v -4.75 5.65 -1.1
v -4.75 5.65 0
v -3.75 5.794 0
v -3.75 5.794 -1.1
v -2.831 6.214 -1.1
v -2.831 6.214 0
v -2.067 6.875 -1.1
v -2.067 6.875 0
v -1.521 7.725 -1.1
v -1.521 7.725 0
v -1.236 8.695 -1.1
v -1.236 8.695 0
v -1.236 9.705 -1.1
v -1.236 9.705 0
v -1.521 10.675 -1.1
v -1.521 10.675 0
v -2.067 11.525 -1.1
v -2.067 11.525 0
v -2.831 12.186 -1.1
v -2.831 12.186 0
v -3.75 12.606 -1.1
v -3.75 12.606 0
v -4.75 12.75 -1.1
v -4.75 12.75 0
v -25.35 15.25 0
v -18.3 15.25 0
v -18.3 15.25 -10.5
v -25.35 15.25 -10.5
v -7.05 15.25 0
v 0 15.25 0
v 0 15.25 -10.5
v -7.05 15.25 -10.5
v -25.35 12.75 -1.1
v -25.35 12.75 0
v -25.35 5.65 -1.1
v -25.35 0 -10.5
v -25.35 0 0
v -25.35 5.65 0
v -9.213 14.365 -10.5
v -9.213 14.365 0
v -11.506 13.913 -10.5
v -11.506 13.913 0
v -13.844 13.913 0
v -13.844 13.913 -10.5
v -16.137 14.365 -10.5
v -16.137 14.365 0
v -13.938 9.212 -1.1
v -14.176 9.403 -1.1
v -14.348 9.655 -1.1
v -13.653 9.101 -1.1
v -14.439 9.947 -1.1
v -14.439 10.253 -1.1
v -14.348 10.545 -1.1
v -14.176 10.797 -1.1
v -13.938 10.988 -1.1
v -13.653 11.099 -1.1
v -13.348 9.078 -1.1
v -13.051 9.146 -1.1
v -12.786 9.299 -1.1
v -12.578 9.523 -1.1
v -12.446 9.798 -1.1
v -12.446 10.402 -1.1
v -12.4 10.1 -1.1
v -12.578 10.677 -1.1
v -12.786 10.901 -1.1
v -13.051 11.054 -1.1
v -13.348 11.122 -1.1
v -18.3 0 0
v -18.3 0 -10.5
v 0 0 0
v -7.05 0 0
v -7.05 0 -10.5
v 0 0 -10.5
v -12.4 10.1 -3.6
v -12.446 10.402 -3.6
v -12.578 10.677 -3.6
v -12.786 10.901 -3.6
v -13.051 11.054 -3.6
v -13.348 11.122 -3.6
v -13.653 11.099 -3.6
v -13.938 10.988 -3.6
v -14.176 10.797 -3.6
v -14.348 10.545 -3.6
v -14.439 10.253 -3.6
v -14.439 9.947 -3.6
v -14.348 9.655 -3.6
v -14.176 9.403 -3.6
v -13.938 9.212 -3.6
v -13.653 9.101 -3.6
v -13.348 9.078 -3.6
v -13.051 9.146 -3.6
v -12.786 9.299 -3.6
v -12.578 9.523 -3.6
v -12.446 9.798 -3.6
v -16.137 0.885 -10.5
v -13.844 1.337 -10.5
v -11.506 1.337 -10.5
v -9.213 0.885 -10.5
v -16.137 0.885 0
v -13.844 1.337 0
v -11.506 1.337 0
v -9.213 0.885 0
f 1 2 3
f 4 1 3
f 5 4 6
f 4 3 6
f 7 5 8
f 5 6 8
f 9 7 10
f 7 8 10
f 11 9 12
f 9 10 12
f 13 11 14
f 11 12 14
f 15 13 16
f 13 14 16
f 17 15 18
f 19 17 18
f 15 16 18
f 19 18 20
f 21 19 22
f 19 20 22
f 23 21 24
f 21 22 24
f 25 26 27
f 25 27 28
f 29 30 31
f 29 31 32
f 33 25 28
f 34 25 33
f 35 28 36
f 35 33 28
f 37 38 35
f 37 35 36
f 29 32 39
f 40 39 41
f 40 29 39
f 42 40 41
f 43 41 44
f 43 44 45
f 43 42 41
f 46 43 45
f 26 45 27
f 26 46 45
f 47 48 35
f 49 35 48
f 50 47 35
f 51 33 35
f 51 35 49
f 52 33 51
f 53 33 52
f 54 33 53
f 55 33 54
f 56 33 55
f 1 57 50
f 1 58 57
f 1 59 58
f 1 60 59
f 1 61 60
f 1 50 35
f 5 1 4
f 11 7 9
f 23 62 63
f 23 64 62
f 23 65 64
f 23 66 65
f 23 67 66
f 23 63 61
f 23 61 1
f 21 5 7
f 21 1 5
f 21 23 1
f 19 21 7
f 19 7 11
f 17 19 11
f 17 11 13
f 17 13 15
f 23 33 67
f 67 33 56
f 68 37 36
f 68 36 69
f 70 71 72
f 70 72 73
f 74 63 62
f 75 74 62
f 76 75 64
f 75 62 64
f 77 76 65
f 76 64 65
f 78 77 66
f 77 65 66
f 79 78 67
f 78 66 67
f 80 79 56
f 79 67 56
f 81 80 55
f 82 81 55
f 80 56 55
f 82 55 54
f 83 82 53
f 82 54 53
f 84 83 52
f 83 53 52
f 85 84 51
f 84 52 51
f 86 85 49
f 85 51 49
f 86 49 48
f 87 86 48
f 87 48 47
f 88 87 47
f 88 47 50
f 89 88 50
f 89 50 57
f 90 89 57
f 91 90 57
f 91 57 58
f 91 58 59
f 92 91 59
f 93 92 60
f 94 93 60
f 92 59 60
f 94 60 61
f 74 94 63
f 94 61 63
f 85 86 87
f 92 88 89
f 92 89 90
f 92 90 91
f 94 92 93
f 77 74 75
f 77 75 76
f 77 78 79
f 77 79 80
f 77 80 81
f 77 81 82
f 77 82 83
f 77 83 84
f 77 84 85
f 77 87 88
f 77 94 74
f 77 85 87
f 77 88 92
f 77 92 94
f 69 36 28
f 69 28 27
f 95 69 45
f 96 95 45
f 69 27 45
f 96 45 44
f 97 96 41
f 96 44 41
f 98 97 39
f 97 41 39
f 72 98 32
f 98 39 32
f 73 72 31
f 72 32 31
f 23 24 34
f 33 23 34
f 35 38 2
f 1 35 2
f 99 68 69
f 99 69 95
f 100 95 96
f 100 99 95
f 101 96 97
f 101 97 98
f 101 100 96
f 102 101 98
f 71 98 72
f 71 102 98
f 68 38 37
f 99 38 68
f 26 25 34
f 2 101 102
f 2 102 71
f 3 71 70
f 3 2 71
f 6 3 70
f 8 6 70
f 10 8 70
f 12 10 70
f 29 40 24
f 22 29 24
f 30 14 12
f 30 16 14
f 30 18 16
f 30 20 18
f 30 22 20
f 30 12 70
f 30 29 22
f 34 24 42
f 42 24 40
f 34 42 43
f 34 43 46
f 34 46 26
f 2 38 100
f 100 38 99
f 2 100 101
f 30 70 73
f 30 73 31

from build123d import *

# Parameters (mm, degrees)
F1_DEPTH = 10.5
F2_DEPTH = 1.1
F3_R     = 1.025
F4_DEPTH = 2.5


with BuildPart() as f1:
    # F0 (on Top) → F1 (new body)
    with BuildSketch(Plane.XY):
        with BuildLine():
            Line((-7.05, 0), (0, 0))
            Line((0, 0), (0, 15.25))
            Line((0, 15.25), (-7.05, 15.25))
            ThreePointArc((-7.05, 15.25), (-12.675, 13.856541), (-18.3, 15.25))
            Line((-18.3, 15.25), (-25.35, 15.25))
            Line((-25.35, 15.25), (-25.35, 12.75))
            Line((-25.35, 12.75), (-4.75, 12.75))
            ThreePointArc((-4.75, 12.75), (-1.2, 9.2), (-4.75, 5.65))
            Line((-4.75, 5.65), (-25.35, 5.65))
            Line((-25.35, 5.65), (-25.35, 0))
            Line((-25.35, 0), (-18.3, 0))
            ThreePointArc((-18.3, 0), (-12.675, 1.393459), (-7.05, 0))
        make_face()
        with BuildLine():
            Line((-25.35, 12.75), (-25.35, 5.65))
            Line((-25.35, 5.65), (-4.75, 5.65))
            ThreePointArc((-4.75, 5.65), (-1.2, 9.2), (-4.75, 12.75))
            Line((-4.75, 12.75), (-25.35, 12.75))
        make_face()
    extrude(amount=-F1_DEPTH)

    # F0 (on Top) → F2 (cut)
    with BuildSketch(Plane.XY):
        with BuildLine():
            Line((-25.35, 12.75), (-25.35, 5.65))
            Line((-25.35, 5.65), (-4.75, 5.65))
            ThreePointArc((-4.75, 5.65), (-1.2, 9.2), (-4.75, 12.75))
            Line((-4.75, 12.75), (-25.35, 12.75))
        make_face()
    extrude(amount=-F2_DEPTH, mode=Mode.SUBTRACT)

    # F3 (on face) → F4 (cut)
    with BuildSketch(Plane.XY.offset(-1.1)):
        with Locations((-13.425, 10.1)):
            Circle(F3_R)
    extrude(amount=-F4_DEPTH, mode=Mode.SUBTRACT)


solid = f1.part
